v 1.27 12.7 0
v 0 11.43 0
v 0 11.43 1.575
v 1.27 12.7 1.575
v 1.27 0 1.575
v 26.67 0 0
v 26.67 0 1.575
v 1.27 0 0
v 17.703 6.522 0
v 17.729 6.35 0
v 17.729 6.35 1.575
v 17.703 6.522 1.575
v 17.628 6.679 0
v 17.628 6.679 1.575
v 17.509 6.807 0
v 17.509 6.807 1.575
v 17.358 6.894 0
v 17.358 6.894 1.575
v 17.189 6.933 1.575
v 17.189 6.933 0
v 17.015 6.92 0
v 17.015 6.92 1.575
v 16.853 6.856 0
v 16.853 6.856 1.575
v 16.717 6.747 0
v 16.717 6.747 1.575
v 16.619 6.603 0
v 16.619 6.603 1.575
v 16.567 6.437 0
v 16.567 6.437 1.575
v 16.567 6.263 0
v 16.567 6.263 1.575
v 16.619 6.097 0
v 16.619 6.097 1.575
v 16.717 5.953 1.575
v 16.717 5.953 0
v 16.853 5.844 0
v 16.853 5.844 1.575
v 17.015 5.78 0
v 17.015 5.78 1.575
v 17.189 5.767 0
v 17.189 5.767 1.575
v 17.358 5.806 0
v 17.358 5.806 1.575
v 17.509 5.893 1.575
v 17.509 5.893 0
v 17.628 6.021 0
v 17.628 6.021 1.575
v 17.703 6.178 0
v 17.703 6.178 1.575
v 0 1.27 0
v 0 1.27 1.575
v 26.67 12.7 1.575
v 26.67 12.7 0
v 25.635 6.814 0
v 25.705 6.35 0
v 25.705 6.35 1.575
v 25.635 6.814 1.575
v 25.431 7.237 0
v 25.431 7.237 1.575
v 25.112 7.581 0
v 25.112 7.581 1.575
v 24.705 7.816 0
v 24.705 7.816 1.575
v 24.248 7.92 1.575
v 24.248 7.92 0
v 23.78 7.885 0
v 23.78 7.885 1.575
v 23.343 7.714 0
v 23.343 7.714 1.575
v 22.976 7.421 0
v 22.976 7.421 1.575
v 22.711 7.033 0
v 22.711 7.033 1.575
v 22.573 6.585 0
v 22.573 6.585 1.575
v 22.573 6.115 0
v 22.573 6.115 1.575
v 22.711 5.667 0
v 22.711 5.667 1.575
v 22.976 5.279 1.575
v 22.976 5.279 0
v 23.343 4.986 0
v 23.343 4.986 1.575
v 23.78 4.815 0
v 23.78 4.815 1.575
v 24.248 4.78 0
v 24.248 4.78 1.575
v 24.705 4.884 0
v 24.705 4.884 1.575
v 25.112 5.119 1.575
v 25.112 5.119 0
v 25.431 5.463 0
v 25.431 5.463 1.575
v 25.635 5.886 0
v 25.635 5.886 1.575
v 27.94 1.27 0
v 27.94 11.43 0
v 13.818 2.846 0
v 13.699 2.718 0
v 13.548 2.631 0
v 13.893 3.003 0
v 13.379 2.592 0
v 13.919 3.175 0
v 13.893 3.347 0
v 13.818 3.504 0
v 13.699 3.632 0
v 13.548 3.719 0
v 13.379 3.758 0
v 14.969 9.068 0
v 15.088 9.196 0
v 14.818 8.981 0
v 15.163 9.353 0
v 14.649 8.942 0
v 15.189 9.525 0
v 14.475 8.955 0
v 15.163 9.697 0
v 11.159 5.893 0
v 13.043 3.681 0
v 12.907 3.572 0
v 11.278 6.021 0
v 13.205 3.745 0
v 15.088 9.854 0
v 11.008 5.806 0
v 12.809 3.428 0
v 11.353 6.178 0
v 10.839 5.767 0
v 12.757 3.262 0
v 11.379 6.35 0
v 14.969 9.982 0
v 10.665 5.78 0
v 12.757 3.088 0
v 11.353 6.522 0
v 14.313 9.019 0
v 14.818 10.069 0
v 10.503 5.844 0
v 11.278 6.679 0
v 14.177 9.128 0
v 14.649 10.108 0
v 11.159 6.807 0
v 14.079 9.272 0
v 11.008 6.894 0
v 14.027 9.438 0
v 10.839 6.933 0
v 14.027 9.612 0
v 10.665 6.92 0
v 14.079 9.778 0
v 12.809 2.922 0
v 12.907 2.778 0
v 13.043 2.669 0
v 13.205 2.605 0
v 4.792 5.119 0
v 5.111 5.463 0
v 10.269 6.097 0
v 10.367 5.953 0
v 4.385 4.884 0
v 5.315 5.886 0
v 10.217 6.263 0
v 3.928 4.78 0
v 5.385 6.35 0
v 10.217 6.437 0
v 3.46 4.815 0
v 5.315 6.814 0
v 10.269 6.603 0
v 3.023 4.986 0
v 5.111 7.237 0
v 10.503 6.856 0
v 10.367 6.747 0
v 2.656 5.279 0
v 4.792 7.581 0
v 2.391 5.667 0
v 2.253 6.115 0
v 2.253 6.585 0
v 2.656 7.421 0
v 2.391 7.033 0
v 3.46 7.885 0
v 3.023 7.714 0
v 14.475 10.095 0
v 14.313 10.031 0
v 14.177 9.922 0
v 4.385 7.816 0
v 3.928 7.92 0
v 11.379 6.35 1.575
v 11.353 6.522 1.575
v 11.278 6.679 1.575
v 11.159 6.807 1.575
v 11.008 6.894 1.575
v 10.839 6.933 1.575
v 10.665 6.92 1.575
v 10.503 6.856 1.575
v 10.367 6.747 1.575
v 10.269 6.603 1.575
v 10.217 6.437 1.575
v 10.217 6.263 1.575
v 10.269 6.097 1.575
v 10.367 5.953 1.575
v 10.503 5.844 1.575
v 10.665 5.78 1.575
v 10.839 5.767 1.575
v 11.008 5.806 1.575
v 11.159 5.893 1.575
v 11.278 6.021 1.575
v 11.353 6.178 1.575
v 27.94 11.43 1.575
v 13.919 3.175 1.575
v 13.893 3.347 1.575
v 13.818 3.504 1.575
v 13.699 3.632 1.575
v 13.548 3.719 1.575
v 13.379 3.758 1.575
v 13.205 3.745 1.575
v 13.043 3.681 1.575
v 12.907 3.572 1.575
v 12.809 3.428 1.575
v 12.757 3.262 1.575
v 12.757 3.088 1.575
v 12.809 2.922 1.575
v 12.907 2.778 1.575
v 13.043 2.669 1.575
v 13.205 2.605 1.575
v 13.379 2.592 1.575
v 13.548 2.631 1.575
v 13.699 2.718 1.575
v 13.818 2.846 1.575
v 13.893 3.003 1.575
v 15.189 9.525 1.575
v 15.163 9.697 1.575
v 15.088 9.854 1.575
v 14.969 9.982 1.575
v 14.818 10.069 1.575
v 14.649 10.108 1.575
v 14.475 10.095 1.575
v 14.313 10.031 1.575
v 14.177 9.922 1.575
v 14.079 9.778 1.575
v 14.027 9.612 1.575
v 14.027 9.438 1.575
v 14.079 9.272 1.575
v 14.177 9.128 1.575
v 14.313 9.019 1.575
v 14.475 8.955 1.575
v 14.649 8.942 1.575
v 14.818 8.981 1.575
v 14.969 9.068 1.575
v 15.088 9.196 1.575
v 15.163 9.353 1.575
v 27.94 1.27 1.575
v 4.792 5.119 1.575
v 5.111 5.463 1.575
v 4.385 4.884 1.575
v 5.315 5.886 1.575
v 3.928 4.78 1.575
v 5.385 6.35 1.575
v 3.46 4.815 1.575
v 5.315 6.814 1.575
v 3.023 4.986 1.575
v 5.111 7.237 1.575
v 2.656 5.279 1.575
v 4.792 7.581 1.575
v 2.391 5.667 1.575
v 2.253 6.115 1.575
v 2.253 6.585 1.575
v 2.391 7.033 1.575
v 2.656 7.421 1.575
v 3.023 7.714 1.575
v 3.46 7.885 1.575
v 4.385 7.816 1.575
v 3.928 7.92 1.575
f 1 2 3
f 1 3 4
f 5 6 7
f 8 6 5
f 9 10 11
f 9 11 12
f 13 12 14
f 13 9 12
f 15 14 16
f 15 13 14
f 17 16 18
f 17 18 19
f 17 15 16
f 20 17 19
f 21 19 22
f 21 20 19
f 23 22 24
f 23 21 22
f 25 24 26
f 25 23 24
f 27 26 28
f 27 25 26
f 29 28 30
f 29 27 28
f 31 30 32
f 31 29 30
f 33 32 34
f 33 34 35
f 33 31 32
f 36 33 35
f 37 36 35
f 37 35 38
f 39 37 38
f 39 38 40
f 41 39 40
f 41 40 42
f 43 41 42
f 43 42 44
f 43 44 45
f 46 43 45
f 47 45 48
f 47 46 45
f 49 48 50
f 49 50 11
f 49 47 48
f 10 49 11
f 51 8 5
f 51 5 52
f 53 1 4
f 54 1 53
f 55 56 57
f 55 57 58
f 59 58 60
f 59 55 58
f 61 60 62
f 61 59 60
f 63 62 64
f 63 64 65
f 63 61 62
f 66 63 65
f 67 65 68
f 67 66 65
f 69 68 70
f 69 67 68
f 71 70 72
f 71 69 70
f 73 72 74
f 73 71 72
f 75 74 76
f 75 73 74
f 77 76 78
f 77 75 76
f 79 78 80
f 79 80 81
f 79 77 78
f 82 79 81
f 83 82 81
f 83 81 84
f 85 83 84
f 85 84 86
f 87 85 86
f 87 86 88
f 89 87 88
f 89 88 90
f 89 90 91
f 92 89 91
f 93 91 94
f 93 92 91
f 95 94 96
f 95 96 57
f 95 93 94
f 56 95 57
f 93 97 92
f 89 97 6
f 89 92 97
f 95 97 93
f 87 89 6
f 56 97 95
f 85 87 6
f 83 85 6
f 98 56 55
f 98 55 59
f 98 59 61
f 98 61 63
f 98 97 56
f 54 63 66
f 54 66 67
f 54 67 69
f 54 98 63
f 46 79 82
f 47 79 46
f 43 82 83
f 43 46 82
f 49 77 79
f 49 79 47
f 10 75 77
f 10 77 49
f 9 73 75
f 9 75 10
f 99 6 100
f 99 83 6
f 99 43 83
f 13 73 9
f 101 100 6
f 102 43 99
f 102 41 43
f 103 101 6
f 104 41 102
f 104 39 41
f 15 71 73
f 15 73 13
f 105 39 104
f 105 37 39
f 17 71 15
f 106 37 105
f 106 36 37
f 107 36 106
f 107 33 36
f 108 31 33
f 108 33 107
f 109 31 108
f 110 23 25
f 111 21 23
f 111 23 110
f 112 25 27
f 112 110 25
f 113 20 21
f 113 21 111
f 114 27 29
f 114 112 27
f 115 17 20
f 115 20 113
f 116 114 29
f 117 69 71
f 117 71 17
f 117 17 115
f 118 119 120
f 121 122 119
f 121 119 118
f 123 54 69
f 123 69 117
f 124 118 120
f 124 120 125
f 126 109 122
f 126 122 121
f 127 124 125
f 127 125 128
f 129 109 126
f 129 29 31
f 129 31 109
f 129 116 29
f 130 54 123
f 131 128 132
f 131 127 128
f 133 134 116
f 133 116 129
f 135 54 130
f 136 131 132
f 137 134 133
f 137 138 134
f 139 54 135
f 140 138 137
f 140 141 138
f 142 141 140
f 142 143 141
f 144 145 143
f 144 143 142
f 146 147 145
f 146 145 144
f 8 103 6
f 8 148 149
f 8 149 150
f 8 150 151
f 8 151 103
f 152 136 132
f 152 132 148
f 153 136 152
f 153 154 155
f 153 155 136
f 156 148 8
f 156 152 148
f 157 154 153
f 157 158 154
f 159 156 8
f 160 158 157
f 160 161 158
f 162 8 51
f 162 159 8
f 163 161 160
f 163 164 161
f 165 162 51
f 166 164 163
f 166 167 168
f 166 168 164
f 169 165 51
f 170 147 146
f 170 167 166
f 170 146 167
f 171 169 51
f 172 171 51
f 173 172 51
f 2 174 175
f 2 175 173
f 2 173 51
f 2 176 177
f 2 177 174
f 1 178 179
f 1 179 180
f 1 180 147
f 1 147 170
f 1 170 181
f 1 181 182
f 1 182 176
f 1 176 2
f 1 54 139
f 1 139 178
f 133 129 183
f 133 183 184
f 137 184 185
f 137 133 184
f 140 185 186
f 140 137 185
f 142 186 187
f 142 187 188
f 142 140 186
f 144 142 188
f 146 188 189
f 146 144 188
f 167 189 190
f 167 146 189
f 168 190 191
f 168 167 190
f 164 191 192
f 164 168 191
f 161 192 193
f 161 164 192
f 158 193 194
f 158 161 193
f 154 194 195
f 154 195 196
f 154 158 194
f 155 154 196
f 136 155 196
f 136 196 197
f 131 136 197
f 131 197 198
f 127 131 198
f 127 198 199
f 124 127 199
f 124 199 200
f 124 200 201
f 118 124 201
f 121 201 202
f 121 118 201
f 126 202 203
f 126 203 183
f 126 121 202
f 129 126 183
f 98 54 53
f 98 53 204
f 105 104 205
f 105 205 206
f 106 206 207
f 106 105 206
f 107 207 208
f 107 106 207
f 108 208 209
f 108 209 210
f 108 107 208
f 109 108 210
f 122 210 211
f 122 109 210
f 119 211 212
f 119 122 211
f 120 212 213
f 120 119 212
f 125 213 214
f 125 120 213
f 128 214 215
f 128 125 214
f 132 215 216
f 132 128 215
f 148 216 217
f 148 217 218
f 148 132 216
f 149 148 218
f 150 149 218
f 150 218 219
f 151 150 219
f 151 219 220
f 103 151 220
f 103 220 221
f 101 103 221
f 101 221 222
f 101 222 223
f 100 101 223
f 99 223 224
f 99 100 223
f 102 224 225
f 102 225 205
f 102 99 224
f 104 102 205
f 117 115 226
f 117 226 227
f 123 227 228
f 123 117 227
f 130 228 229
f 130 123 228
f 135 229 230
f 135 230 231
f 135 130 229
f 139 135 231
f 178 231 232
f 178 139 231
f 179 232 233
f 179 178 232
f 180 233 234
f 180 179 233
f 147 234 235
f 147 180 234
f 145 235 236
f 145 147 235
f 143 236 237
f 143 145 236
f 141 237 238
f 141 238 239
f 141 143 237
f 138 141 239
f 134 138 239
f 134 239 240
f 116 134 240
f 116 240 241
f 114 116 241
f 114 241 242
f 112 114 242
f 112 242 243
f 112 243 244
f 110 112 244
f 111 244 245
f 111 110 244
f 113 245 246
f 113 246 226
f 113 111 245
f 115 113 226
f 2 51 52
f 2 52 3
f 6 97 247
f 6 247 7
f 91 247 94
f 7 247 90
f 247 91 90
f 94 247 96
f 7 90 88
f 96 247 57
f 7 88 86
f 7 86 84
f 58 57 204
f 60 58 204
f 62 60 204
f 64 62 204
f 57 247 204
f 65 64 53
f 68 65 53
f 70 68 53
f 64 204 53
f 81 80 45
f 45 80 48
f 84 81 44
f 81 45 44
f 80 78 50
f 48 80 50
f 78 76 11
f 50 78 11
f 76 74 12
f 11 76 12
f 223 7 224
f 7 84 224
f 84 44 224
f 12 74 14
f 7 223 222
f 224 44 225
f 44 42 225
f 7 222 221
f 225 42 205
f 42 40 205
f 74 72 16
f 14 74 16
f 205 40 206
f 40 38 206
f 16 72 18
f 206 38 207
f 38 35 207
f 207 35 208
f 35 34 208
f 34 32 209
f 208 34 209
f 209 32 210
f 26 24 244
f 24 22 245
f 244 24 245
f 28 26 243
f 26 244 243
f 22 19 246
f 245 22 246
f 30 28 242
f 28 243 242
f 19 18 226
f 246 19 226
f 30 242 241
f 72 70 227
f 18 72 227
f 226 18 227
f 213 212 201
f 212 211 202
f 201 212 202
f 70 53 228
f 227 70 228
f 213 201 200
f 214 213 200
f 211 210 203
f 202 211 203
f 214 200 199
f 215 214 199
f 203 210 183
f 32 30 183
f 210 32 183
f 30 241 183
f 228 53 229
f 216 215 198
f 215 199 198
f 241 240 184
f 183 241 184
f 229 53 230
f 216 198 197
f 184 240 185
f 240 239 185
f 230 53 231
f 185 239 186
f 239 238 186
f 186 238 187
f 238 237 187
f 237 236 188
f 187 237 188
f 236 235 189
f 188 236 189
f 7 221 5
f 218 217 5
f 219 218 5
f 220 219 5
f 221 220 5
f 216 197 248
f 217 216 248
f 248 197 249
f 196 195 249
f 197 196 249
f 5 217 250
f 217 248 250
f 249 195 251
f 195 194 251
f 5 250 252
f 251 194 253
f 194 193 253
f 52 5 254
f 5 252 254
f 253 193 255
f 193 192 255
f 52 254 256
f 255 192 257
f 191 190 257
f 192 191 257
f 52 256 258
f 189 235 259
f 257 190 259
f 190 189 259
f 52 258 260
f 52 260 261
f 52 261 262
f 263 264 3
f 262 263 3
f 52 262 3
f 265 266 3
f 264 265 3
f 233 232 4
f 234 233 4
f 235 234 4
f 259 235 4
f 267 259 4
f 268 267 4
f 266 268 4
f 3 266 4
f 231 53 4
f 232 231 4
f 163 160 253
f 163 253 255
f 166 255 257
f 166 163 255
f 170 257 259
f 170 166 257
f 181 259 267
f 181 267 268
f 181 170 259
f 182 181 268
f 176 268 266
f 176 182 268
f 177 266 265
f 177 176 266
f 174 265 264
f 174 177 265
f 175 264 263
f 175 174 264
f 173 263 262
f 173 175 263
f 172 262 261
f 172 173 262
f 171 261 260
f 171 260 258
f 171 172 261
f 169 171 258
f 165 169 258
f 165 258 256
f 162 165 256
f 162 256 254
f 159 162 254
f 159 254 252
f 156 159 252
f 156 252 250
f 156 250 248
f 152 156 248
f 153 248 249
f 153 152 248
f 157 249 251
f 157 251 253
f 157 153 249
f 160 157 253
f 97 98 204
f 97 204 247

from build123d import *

# Parameters (mm, degrees)
MODEL_R             = 0.5842
MODEL_R_2           = 1.5748
BOSS_EXTRUDE1_DEPTH = 1.5748


with BuildPart() as part:
    # Model → Boss-Extrude1 (new body)
    with BuildSketch(Plane.XY):
        Polygon((0, 11.43), (1.27, 12.7), (26.67, 12.7), (27.94, 11.43), (27.94, 1.27), (26.67, 0), (1.27, 0), (0, 1.27), align=None)
        with Locations((10.795, 6.35)):
            Circle(MODEL_R, mode=Mode.SUBTRACT)
        with Locations((17.145, 6.35)):
            Circle(MODEL_R, mode=Mode.SUBTRACT)
        with Locations((3.81, 6.35)):
            Circle(MODEL_R_2, mode=Mode.SUBTRACT)
        with Locations((24.13, 6.35)):
            Circle(MODEL_R_2, mode=Mode.SUBTRACT)
        with Locations((13.335, 3.175)):
            Circle(MODEL_R, mode=Mode.SUBTRACT)
        with Locations((14.605, 9.525)):
            Circle(MODEL_R, mode=Mode.SUBTRACT)
    extrude(amount=BOSS_EXTRUDE1_DEPTH)


solid = part.part
